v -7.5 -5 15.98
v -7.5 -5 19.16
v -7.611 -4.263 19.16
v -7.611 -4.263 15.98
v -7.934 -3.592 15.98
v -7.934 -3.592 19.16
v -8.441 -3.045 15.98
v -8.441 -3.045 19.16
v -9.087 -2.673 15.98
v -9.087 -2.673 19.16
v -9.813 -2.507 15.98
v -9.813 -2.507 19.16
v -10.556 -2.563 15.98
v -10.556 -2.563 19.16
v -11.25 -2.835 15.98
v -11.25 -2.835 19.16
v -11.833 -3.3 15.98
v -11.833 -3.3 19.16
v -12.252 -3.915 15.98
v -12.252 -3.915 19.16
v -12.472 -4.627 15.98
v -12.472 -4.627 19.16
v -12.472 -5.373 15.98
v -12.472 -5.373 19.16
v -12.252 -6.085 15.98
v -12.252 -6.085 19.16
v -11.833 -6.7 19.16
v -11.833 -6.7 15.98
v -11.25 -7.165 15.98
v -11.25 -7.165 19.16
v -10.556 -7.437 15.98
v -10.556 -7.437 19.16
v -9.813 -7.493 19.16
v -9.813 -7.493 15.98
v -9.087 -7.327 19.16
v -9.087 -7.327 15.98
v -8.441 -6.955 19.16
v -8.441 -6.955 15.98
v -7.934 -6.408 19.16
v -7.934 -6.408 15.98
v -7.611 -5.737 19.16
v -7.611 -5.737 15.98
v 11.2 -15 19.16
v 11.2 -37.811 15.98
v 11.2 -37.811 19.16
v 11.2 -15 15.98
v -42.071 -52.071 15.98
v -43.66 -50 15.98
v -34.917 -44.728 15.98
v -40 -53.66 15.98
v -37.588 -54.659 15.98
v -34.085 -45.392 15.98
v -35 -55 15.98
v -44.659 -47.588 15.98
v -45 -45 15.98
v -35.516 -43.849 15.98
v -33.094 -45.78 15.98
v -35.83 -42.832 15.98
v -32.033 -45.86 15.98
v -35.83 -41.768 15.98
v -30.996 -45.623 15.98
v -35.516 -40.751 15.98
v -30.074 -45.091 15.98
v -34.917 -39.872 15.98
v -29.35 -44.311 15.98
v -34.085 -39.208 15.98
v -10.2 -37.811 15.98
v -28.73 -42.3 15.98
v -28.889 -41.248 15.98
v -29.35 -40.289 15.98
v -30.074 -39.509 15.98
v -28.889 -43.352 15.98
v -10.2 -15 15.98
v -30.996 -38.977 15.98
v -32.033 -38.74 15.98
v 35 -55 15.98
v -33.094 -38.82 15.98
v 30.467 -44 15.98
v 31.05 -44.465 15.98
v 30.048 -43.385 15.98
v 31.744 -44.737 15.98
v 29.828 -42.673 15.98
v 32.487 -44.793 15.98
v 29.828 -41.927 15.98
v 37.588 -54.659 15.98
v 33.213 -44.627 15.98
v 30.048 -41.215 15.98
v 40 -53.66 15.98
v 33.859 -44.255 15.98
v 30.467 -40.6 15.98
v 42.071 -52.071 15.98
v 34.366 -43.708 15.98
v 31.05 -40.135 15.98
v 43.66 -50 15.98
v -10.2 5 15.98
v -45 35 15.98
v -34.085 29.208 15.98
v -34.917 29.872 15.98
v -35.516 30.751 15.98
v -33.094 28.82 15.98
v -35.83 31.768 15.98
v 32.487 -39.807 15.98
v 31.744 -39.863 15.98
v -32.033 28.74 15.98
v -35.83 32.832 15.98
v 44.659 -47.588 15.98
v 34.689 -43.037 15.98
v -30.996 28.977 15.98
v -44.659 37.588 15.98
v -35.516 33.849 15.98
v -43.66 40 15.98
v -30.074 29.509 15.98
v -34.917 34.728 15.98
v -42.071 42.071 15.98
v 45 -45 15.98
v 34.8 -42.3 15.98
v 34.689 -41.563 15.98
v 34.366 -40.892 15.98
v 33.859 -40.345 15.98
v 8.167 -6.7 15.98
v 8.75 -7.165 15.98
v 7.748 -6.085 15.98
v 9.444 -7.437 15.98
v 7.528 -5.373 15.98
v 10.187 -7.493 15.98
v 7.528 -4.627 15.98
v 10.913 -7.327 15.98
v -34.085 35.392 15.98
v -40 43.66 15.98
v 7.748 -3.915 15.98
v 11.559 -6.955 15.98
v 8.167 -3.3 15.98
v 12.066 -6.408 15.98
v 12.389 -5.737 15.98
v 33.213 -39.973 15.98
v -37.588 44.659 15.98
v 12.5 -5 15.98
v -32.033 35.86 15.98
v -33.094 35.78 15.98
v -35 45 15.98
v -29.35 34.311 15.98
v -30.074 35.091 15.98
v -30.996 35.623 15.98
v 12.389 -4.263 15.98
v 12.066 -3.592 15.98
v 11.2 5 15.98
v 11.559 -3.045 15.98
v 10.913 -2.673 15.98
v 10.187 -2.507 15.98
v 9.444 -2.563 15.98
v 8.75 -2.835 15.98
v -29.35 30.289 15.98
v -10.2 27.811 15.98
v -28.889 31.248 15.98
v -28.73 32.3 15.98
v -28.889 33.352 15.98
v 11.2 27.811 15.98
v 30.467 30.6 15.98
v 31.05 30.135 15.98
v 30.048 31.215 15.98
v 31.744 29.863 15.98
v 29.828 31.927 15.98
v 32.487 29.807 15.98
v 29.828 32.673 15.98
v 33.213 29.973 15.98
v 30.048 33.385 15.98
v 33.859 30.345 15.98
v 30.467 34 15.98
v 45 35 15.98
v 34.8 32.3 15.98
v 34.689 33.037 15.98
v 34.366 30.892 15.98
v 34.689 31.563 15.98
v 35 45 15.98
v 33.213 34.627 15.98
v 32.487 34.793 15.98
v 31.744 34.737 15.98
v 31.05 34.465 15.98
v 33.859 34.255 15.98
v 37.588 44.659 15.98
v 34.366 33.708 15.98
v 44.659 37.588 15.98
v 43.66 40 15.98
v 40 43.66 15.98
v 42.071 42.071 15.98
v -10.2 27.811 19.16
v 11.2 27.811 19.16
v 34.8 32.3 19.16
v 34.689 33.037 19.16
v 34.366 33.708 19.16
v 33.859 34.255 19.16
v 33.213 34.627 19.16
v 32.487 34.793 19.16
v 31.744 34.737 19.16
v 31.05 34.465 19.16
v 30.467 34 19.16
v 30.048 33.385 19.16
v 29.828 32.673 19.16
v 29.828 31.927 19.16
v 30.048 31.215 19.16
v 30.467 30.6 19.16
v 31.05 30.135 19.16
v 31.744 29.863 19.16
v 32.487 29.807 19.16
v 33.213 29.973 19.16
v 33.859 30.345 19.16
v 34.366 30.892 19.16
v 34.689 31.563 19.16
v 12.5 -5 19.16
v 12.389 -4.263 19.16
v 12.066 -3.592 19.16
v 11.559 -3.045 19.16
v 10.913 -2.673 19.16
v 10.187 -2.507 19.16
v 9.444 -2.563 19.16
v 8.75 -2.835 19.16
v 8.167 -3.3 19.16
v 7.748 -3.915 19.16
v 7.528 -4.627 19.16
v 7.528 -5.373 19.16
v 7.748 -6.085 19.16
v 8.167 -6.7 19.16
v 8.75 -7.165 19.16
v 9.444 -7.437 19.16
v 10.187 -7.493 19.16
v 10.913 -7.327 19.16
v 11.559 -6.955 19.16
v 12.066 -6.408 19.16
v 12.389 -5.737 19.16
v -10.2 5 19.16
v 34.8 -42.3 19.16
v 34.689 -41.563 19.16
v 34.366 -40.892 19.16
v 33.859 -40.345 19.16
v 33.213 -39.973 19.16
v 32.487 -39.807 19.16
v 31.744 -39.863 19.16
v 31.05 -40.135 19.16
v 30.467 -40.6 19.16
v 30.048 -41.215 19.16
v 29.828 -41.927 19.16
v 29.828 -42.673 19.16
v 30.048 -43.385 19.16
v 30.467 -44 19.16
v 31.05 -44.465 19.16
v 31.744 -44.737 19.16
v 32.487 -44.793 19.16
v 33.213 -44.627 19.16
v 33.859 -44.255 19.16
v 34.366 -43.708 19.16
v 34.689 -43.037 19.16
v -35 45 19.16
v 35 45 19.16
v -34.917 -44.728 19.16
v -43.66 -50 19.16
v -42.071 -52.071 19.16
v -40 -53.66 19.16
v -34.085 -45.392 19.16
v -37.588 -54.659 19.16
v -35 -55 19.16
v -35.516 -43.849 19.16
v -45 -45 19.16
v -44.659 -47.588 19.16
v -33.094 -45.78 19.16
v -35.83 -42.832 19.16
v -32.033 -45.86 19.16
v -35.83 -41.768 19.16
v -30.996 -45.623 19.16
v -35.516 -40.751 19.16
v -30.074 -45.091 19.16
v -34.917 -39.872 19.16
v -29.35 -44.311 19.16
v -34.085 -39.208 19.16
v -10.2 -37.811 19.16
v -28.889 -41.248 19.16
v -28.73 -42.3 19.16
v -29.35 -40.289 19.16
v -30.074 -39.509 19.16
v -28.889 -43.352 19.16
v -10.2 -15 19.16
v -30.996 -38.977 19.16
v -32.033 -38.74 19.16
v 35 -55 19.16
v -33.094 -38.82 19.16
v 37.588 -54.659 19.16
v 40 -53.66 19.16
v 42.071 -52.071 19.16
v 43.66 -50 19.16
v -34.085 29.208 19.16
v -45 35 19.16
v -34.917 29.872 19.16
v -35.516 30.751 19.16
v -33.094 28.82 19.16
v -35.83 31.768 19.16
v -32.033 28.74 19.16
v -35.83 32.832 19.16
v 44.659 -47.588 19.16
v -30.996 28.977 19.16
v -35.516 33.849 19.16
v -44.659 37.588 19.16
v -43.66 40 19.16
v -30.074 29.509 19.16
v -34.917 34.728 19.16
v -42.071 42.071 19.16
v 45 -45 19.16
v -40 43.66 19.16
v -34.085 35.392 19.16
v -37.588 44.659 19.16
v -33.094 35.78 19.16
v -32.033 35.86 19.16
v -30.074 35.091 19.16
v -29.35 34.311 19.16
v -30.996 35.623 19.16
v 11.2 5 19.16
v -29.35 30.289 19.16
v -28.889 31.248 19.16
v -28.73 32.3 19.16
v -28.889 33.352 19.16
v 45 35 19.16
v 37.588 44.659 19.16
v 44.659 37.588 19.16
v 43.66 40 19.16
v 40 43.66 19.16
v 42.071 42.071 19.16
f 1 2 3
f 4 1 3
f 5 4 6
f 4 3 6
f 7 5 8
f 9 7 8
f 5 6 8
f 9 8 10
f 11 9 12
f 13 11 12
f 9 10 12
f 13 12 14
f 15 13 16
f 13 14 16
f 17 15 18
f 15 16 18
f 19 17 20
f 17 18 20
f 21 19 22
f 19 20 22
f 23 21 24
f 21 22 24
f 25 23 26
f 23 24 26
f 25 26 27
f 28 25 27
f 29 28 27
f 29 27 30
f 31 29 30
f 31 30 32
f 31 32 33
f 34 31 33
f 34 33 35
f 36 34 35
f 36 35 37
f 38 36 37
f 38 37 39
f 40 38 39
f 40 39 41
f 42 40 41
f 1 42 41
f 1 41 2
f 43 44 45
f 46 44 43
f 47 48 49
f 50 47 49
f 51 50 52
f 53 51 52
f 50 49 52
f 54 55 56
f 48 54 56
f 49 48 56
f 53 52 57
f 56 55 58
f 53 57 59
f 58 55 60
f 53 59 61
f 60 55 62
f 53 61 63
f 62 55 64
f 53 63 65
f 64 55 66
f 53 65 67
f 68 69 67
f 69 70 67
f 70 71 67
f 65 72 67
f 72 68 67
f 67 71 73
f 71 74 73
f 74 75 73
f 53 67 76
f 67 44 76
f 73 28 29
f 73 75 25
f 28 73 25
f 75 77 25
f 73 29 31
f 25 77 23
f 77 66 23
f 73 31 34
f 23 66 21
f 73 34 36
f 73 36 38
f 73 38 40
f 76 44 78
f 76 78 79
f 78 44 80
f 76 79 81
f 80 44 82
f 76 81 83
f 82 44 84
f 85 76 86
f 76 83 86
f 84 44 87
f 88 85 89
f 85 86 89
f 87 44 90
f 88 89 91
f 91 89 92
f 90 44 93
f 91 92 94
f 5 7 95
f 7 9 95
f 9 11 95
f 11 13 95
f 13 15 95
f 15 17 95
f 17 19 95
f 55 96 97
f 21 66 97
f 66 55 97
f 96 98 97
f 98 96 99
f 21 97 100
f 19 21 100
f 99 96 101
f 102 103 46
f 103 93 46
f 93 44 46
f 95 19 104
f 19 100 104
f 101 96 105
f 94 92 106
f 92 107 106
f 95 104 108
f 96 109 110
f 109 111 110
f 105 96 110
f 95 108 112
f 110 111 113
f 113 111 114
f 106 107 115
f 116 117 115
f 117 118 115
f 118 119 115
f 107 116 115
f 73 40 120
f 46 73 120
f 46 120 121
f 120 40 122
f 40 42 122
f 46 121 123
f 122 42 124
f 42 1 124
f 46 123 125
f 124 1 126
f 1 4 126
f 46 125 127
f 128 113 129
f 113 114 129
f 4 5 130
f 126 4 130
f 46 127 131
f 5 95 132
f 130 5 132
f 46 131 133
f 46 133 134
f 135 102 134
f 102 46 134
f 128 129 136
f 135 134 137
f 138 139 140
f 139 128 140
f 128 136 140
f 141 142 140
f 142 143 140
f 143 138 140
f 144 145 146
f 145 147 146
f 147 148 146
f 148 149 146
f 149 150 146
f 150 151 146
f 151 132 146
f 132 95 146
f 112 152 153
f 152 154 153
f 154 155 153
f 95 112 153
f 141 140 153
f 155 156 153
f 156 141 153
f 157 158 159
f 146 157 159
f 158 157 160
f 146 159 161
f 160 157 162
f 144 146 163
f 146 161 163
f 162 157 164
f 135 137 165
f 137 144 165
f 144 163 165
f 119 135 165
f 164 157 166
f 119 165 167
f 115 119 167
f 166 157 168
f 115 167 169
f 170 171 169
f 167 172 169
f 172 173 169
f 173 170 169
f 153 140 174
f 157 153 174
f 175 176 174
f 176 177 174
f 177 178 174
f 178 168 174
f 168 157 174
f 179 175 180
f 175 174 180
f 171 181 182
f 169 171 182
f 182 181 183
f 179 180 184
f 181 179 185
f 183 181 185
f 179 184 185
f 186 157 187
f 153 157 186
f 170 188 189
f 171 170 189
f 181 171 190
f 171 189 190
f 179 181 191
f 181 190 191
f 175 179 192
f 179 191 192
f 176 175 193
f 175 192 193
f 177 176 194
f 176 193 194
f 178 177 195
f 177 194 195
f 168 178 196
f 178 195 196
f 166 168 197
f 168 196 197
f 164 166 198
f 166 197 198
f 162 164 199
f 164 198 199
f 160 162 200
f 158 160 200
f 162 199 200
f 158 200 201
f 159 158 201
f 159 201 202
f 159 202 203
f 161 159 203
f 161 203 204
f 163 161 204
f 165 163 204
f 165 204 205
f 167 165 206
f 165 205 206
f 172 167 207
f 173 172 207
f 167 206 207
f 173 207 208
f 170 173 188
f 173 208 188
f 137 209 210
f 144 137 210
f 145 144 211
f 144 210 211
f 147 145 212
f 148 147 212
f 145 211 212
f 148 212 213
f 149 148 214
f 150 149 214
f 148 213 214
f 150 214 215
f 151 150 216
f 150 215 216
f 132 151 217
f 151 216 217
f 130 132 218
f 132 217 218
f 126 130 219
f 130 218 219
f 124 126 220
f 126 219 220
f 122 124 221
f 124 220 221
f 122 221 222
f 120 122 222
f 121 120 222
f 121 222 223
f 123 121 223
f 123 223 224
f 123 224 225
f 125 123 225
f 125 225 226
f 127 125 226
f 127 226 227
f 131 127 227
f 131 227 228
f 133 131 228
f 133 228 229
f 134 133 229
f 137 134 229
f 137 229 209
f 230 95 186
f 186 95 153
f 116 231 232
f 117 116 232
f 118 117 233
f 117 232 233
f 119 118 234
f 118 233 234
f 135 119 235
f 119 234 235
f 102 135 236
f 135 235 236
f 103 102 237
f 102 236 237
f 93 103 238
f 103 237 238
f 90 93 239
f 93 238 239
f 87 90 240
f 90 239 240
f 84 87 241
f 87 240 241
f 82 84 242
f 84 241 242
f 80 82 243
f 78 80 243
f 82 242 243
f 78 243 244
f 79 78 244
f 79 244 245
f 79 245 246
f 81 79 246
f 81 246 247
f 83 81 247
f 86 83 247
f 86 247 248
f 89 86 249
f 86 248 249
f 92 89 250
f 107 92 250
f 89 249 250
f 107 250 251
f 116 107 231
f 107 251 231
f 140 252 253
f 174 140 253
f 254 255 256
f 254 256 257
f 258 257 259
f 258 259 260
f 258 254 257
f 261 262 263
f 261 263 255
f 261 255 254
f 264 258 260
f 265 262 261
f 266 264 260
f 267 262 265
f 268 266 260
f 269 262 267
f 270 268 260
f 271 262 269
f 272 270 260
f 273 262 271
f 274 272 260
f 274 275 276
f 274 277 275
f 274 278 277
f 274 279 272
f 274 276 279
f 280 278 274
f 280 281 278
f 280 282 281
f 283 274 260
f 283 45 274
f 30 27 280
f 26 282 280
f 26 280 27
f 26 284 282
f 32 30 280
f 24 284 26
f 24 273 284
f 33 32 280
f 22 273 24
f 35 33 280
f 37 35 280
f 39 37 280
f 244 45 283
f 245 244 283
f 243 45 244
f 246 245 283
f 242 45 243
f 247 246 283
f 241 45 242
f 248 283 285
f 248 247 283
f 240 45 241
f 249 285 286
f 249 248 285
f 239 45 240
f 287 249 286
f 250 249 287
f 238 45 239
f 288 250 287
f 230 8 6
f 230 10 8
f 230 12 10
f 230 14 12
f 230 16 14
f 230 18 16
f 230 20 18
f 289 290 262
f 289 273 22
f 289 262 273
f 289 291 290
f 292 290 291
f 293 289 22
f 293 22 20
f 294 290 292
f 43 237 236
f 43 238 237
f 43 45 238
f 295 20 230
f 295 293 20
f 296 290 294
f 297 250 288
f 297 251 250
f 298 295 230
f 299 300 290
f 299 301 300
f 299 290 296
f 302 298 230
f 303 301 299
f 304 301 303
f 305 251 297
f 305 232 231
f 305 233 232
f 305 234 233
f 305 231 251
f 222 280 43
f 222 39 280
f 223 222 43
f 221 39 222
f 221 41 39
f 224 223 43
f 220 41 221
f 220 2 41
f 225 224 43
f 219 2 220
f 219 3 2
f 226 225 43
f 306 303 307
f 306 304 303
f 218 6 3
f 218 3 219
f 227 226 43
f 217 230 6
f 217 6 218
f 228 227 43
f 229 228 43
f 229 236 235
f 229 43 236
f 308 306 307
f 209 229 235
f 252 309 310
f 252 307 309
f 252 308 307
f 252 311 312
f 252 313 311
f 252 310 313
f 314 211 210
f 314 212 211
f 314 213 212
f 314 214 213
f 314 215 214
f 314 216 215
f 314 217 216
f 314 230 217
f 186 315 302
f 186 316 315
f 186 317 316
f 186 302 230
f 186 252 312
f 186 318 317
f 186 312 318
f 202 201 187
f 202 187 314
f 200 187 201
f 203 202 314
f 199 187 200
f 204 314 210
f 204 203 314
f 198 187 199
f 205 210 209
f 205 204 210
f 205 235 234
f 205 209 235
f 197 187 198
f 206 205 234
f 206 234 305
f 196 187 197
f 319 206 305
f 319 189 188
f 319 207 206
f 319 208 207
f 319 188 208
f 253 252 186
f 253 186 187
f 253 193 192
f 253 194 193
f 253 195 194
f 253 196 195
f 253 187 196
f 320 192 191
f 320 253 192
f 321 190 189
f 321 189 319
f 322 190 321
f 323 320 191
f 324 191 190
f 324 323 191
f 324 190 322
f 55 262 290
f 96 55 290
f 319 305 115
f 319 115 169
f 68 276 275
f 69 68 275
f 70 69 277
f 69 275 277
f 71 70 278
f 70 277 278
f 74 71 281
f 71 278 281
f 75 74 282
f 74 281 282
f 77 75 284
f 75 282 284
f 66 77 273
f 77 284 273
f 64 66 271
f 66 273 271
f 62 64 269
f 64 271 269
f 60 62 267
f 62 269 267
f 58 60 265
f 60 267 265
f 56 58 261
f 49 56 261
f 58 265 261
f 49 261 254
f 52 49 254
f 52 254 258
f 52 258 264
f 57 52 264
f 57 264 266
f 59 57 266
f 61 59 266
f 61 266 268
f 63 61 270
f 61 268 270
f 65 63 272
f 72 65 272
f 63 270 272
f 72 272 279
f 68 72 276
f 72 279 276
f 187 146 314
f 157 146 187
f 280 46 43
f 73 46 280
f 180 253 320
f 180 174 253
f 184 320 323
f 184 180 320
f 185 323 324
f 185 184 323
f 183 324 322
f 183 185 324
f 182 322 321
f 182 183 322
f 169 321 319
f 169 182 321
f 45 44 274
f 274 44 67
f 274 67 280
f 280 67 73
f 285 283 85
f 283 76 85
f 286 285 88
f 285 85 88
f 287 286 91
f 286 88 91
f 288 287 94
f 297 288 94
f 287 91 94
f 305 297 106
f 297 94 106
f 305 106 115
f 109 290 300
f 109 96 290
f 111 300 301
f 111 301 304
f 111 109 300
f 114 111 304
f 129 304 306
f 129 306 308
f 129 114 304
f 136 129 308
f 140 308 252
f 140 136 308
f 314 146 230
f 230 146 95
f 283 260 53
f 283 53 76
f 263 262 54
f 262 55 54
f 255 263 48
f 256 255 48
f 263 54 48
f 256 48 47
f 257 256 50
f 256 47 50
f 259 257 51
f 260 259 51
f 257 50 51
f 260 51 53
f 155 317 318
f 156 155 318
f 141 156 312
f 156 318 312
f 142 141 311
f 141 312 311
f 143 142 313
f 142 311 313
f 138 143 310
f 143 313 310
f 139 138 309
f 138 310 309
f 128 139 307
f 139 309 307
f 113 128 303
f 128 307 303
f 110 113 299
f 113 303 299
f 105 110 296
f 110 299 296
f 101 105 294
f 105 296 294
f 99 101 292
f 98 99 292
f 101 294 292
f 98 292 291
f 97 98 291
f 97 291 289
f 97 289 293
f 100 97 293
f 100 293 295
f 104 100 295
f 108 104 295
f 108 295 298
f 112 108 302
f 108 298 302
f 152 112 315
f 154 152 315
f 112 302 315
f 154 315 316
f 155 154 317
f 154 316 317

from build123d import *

# Parameters (mm, degrees)
BOSS_EXTRUDE1_START = 19.16
SKETCH1_W           = 90
SKETCH1_H           = 100
SKETCH1_R           = 2.5
SKETCH1_R_2         = 3.57
BOSS_EXTRUDE1_DEPTH = 3.18
FILLET1_R           = 10
SKETCH2_R           = 2.5
CUT_EXTRUDE1_DEPTH  = 10
SKETCH3_W           = 21.4
SKETCH3_H           = 22.810510703
CUT_EXTRUDE2_DEPTH  = 72.134467033


with BuildPart() as part:
    # Sketch1 → Boss-Extrude1 (new body)
    with BuildSketch(Plane.XY.offset(BOSS_EXTRUDE1_START)):
        with Locations((0, -5)):
            Rectangle(SKETCH1_W, SKETCH1_H)
        with Locations((32.3, -42.3)):
            Circle(SKETCH1_R, mode=Mode.SUBTRACT)
        with Locations((-32.3, -42.3)):
            Circle(SKETCH1_R_2, mode=Mode.SUBTRACT)
        with Locations((-32.3, 32.3)):
            Circle(SKETCH1_R_2, mode=Mode.SUBTRACT)
        with Locations((32.3, 32.3)):
            Circle(SKETCH1_R, mode=Mode.SUBTRACT)
    extrude(amount=-BOSS_EXTRUDE1_DEPTH)

    # Fillet1
    fillet1_edges = [part.edges().sort_by_distance(p)[0] for p in [
        (-45, 45, 17.57),
        (45, 45, 17.57),
        (45, -55, 17.57),
        (-45, -55, 17.57),
    ]]
    fillet(fillet1_edges, radius=FILLET1_R)

    # Sketch2 → Cut-Extrude1 (cut)
    with BuildSketch(Plane.XY.offset(19.16)):
        with Locations((10, -5)):
            Circle(SKETCH2_R)
        with Locations((-10, -5)):
            Circle(SKETCH2_R)
    extrude(amount=-CUT_EXTRUDE1_DEPTH, mode=Mode.SUBTRACT)

    # Sketch3 → Cut-Extrude2 (cut, through all)
    with BuildSketch(Plane(origin=(0, 0, 15.98), x_dir=(-1, 0, 0), z_dir=(0, 0, -1))):
        with Locations((-0.5, 16.405255352)):
            Rectangle(SKETCH3_W, SKETCH3_H)
        with Locations((-0.5, -26.405255352)):
            Rectangle(SKETCH3_W, SKETCH3_H)
    extrude(amount=-CUT_EXTRUDE2_DEPTH, mode=Mode.SUBTRACT)


solid = part.part
